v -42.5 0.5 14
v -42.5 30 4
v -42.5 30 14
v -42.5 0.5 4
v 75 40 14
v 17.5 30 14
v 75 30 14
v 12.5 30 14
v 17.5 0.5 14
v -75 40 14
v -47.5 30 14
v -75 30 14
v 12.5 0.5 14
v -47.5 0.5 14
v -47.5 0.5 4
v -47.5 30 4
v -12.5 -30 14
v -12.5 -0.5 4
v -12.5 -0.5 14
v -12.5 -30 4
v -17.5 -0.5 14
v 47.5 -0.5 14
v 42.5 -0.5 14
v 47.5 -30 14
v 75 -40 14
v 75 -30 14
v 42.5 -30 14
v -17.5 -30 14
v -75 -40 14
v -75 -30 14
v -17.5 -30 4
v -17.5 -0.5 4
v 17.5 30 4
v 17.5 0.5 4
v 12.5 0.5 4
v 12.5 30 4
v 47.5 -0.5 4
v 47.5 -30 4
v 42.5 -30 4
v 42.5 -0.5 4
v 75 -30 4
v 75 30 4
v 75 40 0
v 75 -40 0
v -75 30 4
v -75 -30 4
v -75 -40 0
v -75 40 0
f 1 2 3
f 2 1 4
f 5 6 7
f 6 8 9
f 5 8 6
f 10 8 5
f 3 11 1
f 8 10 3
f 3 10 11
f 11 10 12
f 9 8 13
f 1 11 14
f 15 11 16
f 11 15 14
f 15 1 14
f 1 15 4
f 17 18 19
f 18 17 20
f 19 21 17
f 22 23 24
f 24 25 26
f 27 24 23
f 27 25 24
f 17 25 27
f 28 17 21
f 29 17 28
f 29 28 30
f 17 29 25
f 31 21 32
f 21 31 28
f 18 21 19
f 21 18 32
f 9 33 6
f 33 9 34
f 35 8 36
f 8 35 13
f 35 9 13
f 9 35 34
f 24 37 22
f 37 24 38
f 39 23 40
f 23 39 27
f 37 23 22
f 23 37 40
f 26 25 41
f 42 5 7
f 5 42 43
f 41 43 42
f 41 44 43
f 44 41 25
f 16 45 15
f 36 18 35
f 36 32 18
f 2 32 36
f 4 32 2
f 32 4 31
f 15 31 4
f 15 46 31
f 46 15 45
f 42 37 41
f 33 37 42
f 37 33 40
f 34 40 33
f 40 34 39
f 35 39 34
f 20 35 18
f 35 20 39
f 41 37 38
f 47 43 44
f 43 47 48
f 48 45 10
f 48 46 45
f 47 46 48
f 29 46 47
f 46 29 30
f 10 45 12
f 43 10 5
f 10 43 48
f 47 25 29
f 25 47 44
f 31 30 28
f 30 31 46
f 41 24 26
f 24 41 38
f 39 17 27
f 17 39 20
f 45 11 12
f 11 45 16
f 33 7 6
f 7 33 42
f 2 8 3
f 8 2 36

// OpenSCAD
$fn = 32;

// ----------------------------------------------------------------------
// Rib frame 150 x 80 x 14
// 4 ribs at 30 mm pitch, staggered
// ----------------------------------------------------------------------

// --- parameters (mm) ---
frame = [150, 80, 4];  // base plate size (x, y, z)
rail_w = 10;           // side rail width
ribs = 4;              // number of ribs
rib_t = 5;             // rib thickness
rib_h = 10;            // rib height above the base plate
pitch = 30;            // pitch between rib centres

// --- derived feature positions (mm) ---
span = (ribs - 1) * pitch;          // = 90   distance between the outer ribs
origin_x = -span / 2;               // = -45   X of the first rib
rib_len = frame[1] / 2 - rail_w + 0.5;  // = 30.5   length of a staggered rib
rib_y = 0.5 + rib_len / 2;          // = 15.75   Y of a staggered rib centre
row_offset = 2 * rib_y;             // = 31.5   distance between the two rows
feature_centers = [
  [origin_x + 0 * pitch, rib_y],
  [origin_x + 1 * pitch, -rib_y],
  [origin_x + 2 * pitch, rib_y],
  [origin_x + 3 * pitch, -rib_y]
];   // rib centre line, drives the rib loop

// base plate, two side rails, then the ribs read straight off feature_centers
union() {
  translate([-frame[0] / 2, -frame[1] / 2, 0]) cube(frame);
  translate([-frame[0] / 2, -frame[1] / 2, 0]) cube([frame[0], rail_w, frame[2] + rib_h]);
  translate([-frame[0] / 2, frame[1] / 2 - rail_w, 0]) cube([frame[0], rail_w, frame[2] + rib_h]);
  for (centre = feature_centers)
    translate([centre[0] - rib_t / 2, centre[1] - rib_len / 2, frame[2] - 1])
      cube([rib_t, rib_len, rib_h + 1]);
}
